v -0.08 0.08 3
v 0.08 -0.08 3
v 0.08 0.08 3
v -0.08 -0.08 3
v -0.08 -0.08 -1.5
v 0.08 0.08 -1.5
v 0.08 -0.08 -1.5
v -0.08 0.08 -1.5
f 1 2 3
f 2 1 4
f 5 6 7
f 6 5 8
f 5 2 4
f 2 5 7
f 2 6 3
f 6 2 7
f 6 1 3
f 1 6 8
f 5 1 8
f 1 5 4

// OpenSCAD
// Tent shell kit: corner outer. See lib/lodge_kit.scad.
include <lib/lodge_kit.scad>
kind = "tent";
corner_outer();
